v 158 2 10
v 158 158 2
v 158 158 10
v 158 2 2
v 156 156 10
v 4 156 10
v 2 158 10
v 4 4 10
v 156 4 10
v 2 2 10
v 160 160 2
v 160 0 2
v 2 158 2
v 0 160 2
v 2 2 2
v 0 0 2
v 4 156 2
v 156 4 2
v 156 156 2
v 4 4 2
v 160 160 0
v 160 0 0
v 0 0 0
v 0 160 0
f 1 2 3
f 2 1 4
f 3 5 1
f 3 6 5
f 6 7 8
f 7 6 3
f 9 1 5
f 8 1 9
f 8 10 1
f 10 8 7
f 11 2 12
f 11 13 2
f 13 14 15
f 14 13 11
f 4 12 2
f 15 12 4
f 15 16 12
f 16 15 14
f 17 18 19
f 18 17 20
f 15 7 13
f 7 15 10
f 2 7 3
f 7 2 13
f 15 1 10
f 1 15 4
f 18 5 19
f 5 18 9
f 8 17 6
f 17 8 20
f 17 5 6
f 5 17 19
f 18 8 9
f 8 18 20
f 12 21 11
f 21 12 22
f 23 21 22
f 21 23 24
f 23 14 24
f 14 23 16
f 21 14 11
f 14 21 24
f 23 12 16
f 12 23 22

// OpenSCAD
$fn = 100;

Height = 196;
Width = 100;
RadiusOuter = 20;

StripeWidth = 7;
StripeBorder = 1.5;
StripeOuterWidth = StripeWidth+2*StripeBorder;
StripeBottom = 2;
StripeHeight = 14;
CableHeight = 2;
TrennerHeigh = 165;
TrennerAbstandUnten = 10;
TrennerAbstandOben = 3;

StandConnectorHeight = 10;
StandConnectorWidth = 44;
StandConnectorInnerWidth = StandConnectorWidth - 2*5;

Depth = StripeBottom + StripeHeight + CableHeight;
InnerWidth = Width - StripeWidth;

ConnectorGap = 20;

StandDepth = 160;
StandHeight = 33;
StandWidth = 160;
StandBorder = 2;

ESP32Width = 28;
ESP32Length = 49;
ESP32XOffset = 30;
ESP32YOffset = 35;

ESP32PCBHolderDepth = 7;
ESP32PCBHolderShortDepth = 8;
ESP32PCBHolderHeight = 13;
Esp32PCBWidth = 48.8;
ESP32PCBLength = 71;
ESP32PCBShortLength = 10;
ESP32PCBOffsetX = ESP32XOffset-10.5;
ESP32PCBOffsetY = ESP32YOffset-ESP32PCBHolderDepth-10;
ESP32PCBOffsetZ = 9.5;
ESP32PCBThickness = 2;
ESP32PCBGapDepth = 2;

RFIDHolderOffsetY = ESP32YOffset+103;
PFIDHolderOffsetX = ESP32PCBOffsetX+3;
RFIDHolderHoleDistanceX = 25.5;
RFIDHolderHeight = 3;

RTCHolderOffset_X = 133;
RTCHolderOffsetY = ESP32PCBOffsetY-3;
RTCHolderHoleDistance = 19.5;

// ConnectorHolderOffsetZ = 11;
ConnectorPCBWidth = 20.3;
ConnectorPCBLength = 80;
ConnectorHolderBottomHeight = 1.2;
ConnectorholderBottomWidth = 10;
ConnectorHolderBottomDepth = 8;
ConnectorHolderPCBGap = 2;
ConnectorHolderPCBDepth = 2.0;
ConnectorHolderPCBHeight = 5.5;
ConnectorHolderPCBWidth = 3.5;

KeypadKeyBreite = 13;
KeypadSpalten = 5;
KeypadReihen = 4;
KeypadAussparungBreite = KeypadKeyBreite * KeypadSpalten;
KeypadAussparungTiefe = KeypadKeyBreite * KeypadReihen;
KeypadOffsetY = 145;
KeypadOffsetX = 75;
KeypadHalterHoehe = 3.5;
KeypadPlatinenBreite = 100;
KeypadHalterOffsetX1 = 17.5;
KeypadHalterOffsetX2 = 19.5;
KeypadHalterOffsetY1 = 6;
KeypadHalterOffsetY2 = 71;
KeypadSpalt = 0.7;

DisplayHalterDurchmesserBohrung = 3;
DisplayHalterOffsetX = -1.65;
DisplayHalterOffsetY = 7.4;
DisplayHalterKantenlaenge = DisplayHalterDurchmesserBohrung + 4;

Keys =       ["►", "6", "‖", "8", "©", "1", "2", "3", "4", "T3", "▼", "▲", "X", "H", "T2", "+", "-", "▐◄", "►▌", "T1"];
KeysOffset = [0,   0,   3,   0,   0,   0,   0,   0,   0,   -2,   0,   0,   0,   0,   -2,   0,   0,   -3.5, -3,   -2];
KeysSize   = [2,   0,   2,   0,   1,   0,   0,   0,   0,   1,    1,   1,   1,   1,    1,   1,   1,   1,    1,    1];

ScrewDiameter = 3;
DigitAbstand = 25;

SchwalbenschwanzHoehe = 5;
SchwalbenschwanzBreite1 = 5;
SchwalbenschwanzBreite2 = 3;

BottomBorderHeight = 8;

//Digit(DigitAbstand, false, true);
// translate([0, Width + DigitAbstand, 5])
//     Digit(0, false, false);    
// translate([0, 2*Width + 2*DigitAbstand, 0])
//     Trenner();

// translate([0, 2*Width + 3*DigitAbstand+StripeOuterWidth, 5])
//     Digit(DigitAbstand, false, false);

// translate([0, 3*Width + 4*DigitAbstand+StripeOuterWidth, 0])
//     Digit(0, true, false); 

//Stand();
//StandInvers();

Bottom();

module Bottom()
{
    cube([StandWidth, StandDepth, StandBorder]);
    translate([StandBorder, StandBorder, StandBorder])
    difference()
    {
        cube([StandWidth-2*StandBorder, StandDepth-2*StandBorder, BottomBorderHeight]);
        translate([StandBorder, StandBorder, 0])
        {
            cube([StandWidth-4*StandBorder, StandDepth-4*StandBorder, BottomBorderHeight+1]);
        }
    }
}

//Key("A", true, 0, 2);
module StandInvers()
{
    translate([KeypadOffsetX, KeypadOffsetY, StandBorder])
    {
        rotate([180,0,0])
            KeyPad(false);
    }
    
    translate([23, 90, 0])
        scale([0.1, 0.1, 1])
            linear_extrude(StandBorder)
                import("rfid.svg");
}

module Stand()
{
    difference()
    {
        cube([StandWidth, StandDepth, StandHeight]);
        translate([StandBorder, StandBorder, StandBorder])
        {
            cube([StandWidth-2*StandBorder, StandDepth-2*StandBorder, StandHeight]);
        }
        
        // ESP32 Hole
        translate([ESP32XOffset, ESP32YOffset, 0])
            cube([ESP32Length, ESP32Width, 100]);
        
        translate([KeypadOffsetX, KeypadOffsetY, StandBorder])
        {
            rotate([180,0,0])
                KeyPad(true);
        }
        
        translate([23, 90, 0])
            scale([0.1, 0.1, 1])
                linear_extrude(10)
                    import("rfid.svg");

                
        translate([(StandWidth-StandConnectorInnerWidth)/2, 0, 0])
            cube([StandConnectorInnerWidth, Depth, StandConnectorHeight]);
        translate([(StandWidth-StandConnectorWidth)/2, 0, 0])
            cube([StandConnectorWidth, StripeBottom, StandConnectorHeight]);
    }
    translate([KeypadOffsetX-KeypadAussparungTiefe/2, KeypadOffsetY-KeypadAussparungBreite, StandBorder])
        KeypadHalter();
    
    // ESP32 Holder
    translate([ESP32PCBOffsetX, ESP32PCBOffsetY+ESP32PCBGapDepth, StandBorder])
        ESP32PCBHolderLong();  
    translate([ESP32PCBOffsetX, ESP32PCBOffsetY+ESP32PCBHolderDepth+Esp32PCBWidth-ESP32PCBGapDepth, StandBorder])
    {
        ScrewHolder(ESP32PCBOffsetZ, 0);
    }
    translate([ESP32PCBOffsetX+ESP32PCBLength-ESP32PCBShortLength, ESP32PCBOffsetY+ESP32PCBHolderDepth+Esp32PCBWidth-ESP32PCBGapDepth, StandBorder])
        ScrewHolder(ESP32PCBOffsetZ, 0);
    
    // RFID Holder
    translate([PFIDHolderOffsetX, RFIDHolderOffsetY-ESP32PCBHolderShortDepth, StandBorder])
    {
        ScrewHolder(RFIDHolderHeight, 0);
    }
    translate([PFIDHolderOffsetX+RFIDHolderHoleDistanceX, RFIDHolderOffsetY-ESP32PCBHolderShortDepth, StandBorder])
        ScrewHolder(RFIDHolderHeight, 0);
    
    // ConnectorHolder
    translate([StandWidth,5,StandBorder])
    rotate([0,0,90])
        ConnectorHolder();
    
    // RTC Holder
   
}

module ConnectorHolder()
{
    cube([ConnectorholderBottomWidth, ConnectorHolderBottomDepth, ConnectorHolderBottomHeight]);
    translate([0, 0, ConnectorHolderBottomHeight])
    {
        cube([ConnectorholderBottomWidth, ConnectorHolderPCBDepth, ConnectorHolderPCBGap]);
        translate([ConnectorholderBottomWidth, 0, 0])
            rotate([0,-90,0])
                linear_extrude(ConnectorholderBottomWidth)
                    polygon(points=[[ConnectorHolderPCBHeight,0],[ConnectorHolderPCBGap,0],[ConnectorHolderPCBGap,ConnectorHolderPCBWidth],]);
    }

    translate([ConnectorPCBLength-ConnectorholderBottomWidth*1.5, 0, 0])
    {
        cube([ConnectorholderBottomWidth, ConnectorHolderBottomDepth, ConnectorHolderBottomHeight]);
        translate([0, 0, ConnectorHolderBottomHeight])
        {
            cube([ConnectorholderBottomWidth, ConnectorHolderPCBDepth, ConnectorHolderPCBGap]);
            translate([ConnectorholderBottomWidth, 0, 0])
                rotate([0,-90,0])
                    linear_extrude(ConnectorholderBottomWidth)
                        polygon(points=[[ConnectorHolderPCBHeight,0],[ConnectorHolderPCBGap,0],[ConnectorHolderPCBGap,ConnectorHolderPCBWidth],]);
        }
    }

    translate([ConnectorPCBLength-ConnectorholderBottomWidth*.5, 2*ConnectorHolderPCBDepth+ConnectorPCBWidth+1, 0])
    {
        rotate([0,0,180])
        {
            cube([ConnectorholderBottomWidth, ConnectorHolderBottomDepth, ConnectorHolderBottomHeight]);
            translate([0, 0, ConnectorHolderBottomHeight])
            {
                cube([ConnectorholderBottomWidth, ConnectorHolderPCBDepth, ConnectorHolderPCBGap]);
                translate([ConnectorholderBottomWidth, 0, 0])
                    rotate([0,-90,0])
                        linear_extrude(ConnectorholderBottomWidth)
                            polygon(points=[[ConnectorHolderPCBHeight,0],[ConnectorHolderPCBGap,0],[ConnectorHolderPCBGap,ConnectorHolderPCBWidth],]);
            }

            translate([ConnectorPCBLength-ConnectorholderBottomWidth*1.5, 0, 0])
            {
                cube([ConnectorholderBottomWidth, ConnectorHolderBottomDepth, ConnectorHolderBottomHeight]);
                translate([0, 0, ConnectorHolderBottomHeight])
                {
                    cube([ConnectorholderBottomWidth, ConnectorHolderPCBDepth, ConnectorHolderPCBGap]);
                    translate([ConnectorholderBottomWidth, 0, 0])
                        rotate([0,-90,0])
                            linear_extrude(ConnectorholderBottomWidth)
                                polygon(points=[[ConnectorHolderPCBHeight,0],[ConnectorHolderPCBGap,0],[ConnectorHolderPCBGap,ConnectorHolderPCBWidth],]);
                }
            }
        }
    }
}

module ESP32PCBHolderLong()
{
    difference()
    {
        cube([ESP32PCBLength, ESP32PCBHolderDepth, ESP32PCBHolderHeight]);
        translate([0,ESP32PCBHolderDepth-ESP32PCBGapDepth,ESP32PCBOffsetZ])
            cube([ESP32PCBLength, ESP32PCBGapDepth, ESP32PCBThickness]);
    }
}

module ScrewHolder(height, rotate)
{
    rotate([0,0,rotate])
    {
        difference()
        {
            cube([ESP32PCBShortLength, ESP32PCBHolderShortDepth, height]);
            translate([ESP32PCBShortLength/2, ESP32PCBHolderShortDepth-ScrewDiameter, 0])
                cylinder(d=ScrewDiameter, h=100);
        }
    }
}

module KeyPad(invers)
{
    if (invers)
    {
        translate([0,KeypadAussparungTiefe,0])
            cube([KeypadAussparungBreite + KeypadSpalt,KeypadSpalt,StandBorder]);
    }

    for (y=[0:KeypadReihen-1])
    {
        for (x=[0:KeypadSpalten-1])
        {
            index = y*KeypadSpalten+x;
            translate([x*KeypadKeyBreite,y*KeypadKeyBreite,0])
            {
                Key(Keys[index], invers, KeysOffset[index], KeysSize[index]);
            }
        }
    }
}

module Key(text, invers, offset, keySize)
{
    if (keySize > 0)
    {
        if (invers)
        {
            difference()
            {
                cube([KeypadKeyBreite*keySize + KeypadSpalt,KeypadKeyBreite*keySize-2,StandBorder+1.5]);
                translate([KeypadSpalt,KeypadSpalt,StandBorder-1])
                {
                    cube([KeypadKeyBreite*keySize-KeypadSpalt,KeypadKeyBreite*keySize,StandBorder]);
                }
            }
        }
        
        translate([4.5+offset,4,1])
        {
            linear_extrude(1)
            { 
                if (keySize == 1)
                {
                    size = 6 - len(text) * 0.5;
                    text(text, size=size, font = "Arial:style=Bold");
                }
                else
                {
                    size = (6 - len(text) * 0.5)*3;
                    text(text, size=size, font = "Arial:style=Bold");
                }
                
            }
        }
    }
}

module KeypadHalter()
{
  Rechts = KeypadHalterOffsetX1;
  Links = KeypadHalterOffsetX1 + 83.8;
  Links_alt = 0 - KeypadHalterOffsetX2;
  Unten = KeypadHalterOffsetY1;
  Oben = KeypadHalterOffsetY1 + 63.5;
  Oben_alt = KeypadHalterOffsetY2;
    
  translate([Rechts,Unten,0])
  {
    Halter(DisplayHalterKantenlaenge, KeypadHalterHoehe, DisplayHalterDurchmesserBohrung);
  }
  
  translate([Links,Unten,0])
  {
    Halter(DisplayHalterKantenlaenge, KeypadHalterHoehe, DisplayHalterDurchmesserBohrung);
  }
   
  translate([Rechts,Oben,0])
  {
    Halter(DisplayHalterKantenlaenge, KeypadHalterHoehe, DisplayHalterDurchmesserBohrung);
  }
  
  translate([Links,Oben,0])
  {
    Halter(DisplayHalterKantenlaenge, KeypadHalterHoehe, DisplayHalterDurchmesserBohrung);
  }
}

module Halter(Kantenlaenge, Hoehe, DurchmesserBohrung)
{
  translate([-Kantenlaenge/2, -Kantenlaenge/2, 0])
  {
    difference()
    {
      cube([Kantenlaenge, Kantenlaenge, Hoehe]);
      translate([Kantenlaenge/2, Kantenlaenge/2,0])
      {
        cylinder(h=Hoehe, d=DurchmesserBohrung);       
      }
    }
  }
}

module Trenner()
{
    difference()
    {
        union()
        {
            translate([0,-DigitAbstand,0])
                DigitConnector(StripeOuterWidth+DigitAbstand*3,0, false);
            translate([-StandConnectorHeight, -Width/2+StripeOuterWidth/2,0])
                StandConnector();

            cube([TrennerHeigh+TrennerAbstandOben+TrennerAbstandUnten, StripeOuterWidth, Depth]);

            translate([-StandConnectorHeight/2,(StripeOuterWidth+DigitAbstand*3)/2+5,0])
                SchwalbenschwanzVerbinder();
        }

        // Aussparung Mitte
        translate([-StandConnectorHeight-2*StripeBorder-50,-ConnectorGap/2+StripeOuterWidth/2,-0.001-StripeBorder])
            cube([StandConnectorHeight+StripeBorder+50, ConnectorGap, Depth]);

        // Stripe Aussparung
        translate([StandConnectorHeight,StripeBorder,StripeBottom+CableHeight])
            cube([TrennerHeigh, StripeWidth, Depth*2]);
        translate([StandConnectorHeight-200,StripeBorder+1,StripeBottom])
            cube([TrennerHeigh+200, StripeWidth-2, Depth-2*StripeBottom]);

        // Horizontaler Kabelsteg
        translate([-StandBorder-2,-100,-0.1])
            cube([2, 200, 8]);

        translate([-StandConnectorHeight/2,(-StripeOuterWidth-DigitAbstand*3)/2+SchwalbenschwanzHoehe,0])
            SchwalbenschwanzVerbinder();
    }
}

module SchwalbenschwanzVerbinder()
{
    linear_extrude(Depth)
    {
        polygon(points=[
            [SchwalbenschwanzBreite2/2,0],
            [SchwalbenschwanzBreite1/2,SchwalbenschwanzHoehe],
            [-SchwalbenschwanzBreite1/2,SchwalbenschwanzHoehe],
            [-SchwalbenschwanzBreite2/2,0]]);
    }
}

module Digit(connectorOffsetY, endeLinks, endeRechts)
{
    difference()
    {
        union()
        {
            DigitConnector(Width,connectorOffsetY, true, endeLinks, endeRechts);
            DigitHolder(Width);
        }
        
        // translate([-StandConnectorHeight,(Width-ConnectorGap)/2,-StripeBorder])
        //     cube([StandConnectorHeight+StripeBorder, ConnectorGap, Depth]);
        // translate([StripeBorder,(Width-ConnectorGap)/2,StripeBottom+CableHeight])
        //     cube([StandConnectorHeight, ConnectorGap, Depth]);
        // translate([StripeBorder,(Width-ConnectorGap)/2,StripeBottom])
        //     cube([3, ConnectorGap, Depth]);
        
        // translate([-StripeBottom,Width-5-(Width-StandConnectorWidth)/2,-StripeBottom])
        //     cube([StripeBottom, 5, Depth]);
        // translate([-StripeBottom,(Width-StandConnectorWidth)/2,-StripeBottom])
        //     cube([StripeBottom, 5, Depth]);
    }
}


module DigitHolder(width)
{
    difference()
    {
        union()
        {
            Base(width);
            translate([(Height-StripeOuterWidth)/2, 0, 0])
                cube([StripeOuterWidth, Width, Depth]);
        }
        
        translate([0,0,StripeBottom + CableHeight])  
        {
            difference()
            {
                RoundedRectangle(RadiusOuter, StripeBorder);
                RoundedRectangle(RadiusOuter, StripeBorder + StripeWidth);
            }
        }
        
        translate([0,0,StripeBottom])  
        {
            difference()
            {
                RoundedRectangle(RadiusOuter, StripeBorder+1);
                RoundedRectangle(RadiusOuter, StripeBorder+StripeWidth-1);
            }
        }
        
        translate([(Height-StripeOuterWidth)/2+StripeBorder, StripeWidth/2, StripeBottom+CableHeight])
           cube([StripeWidth, InnerWidth, Depth]);
        
        translate([(Height-StripeOuterWidth)/2+StripeBorder+2, StripeWidth/2, StripeBottom])
           cube([StripeWidth-4, InnerWidth, Depth]);
    }
}

module Base(width)
{
    difference()
    {
        RoundedRectangle(RadiusOuter, 0);
        RoundedRectangle(RadiusOuter, StripeOuterWidth);
        
        // Durchbruch
        translate([-StandBorder-2, width/2,3])
            cube([10, 20, 8]);
    }
}

module RoundedRectangle(radius, offset)
{
    offsetradius = radius - offset;
    hull()
    {
        translate([radius, radius, 0])
            cylinder(h=Depth, r=offsetradius);
        translate([radius, Width-radius, 0])
            cylinder(h=Depth, r=offsetradius);
        translate([Height-radius, Width-radius, 0])
            cylinder(h=Depth, r=offsetradius);
        translate([Height-radius, radius, 0])
            cylinder(h=Depth, r=offsetradius);
    }
}

module DigitConnector(width, offsetY, durchbruch, endeLinks, endeRechts)
{
    difference()
    {
        union()
        {
            translate([-StandConnectorHeight,-DigitAbstand/2+offsetY,0])
            {
                cube([StandConnectorHeight, width, Depth]);
                if (!endeLinks)
                {
                    translate([StandConnectorHeight/2,width,0])
                        SchwalbenschwanzVerbinder();
                }
            }
        }

        // Durchbruch
        if (durchbruch)
            translate([-StandBorder-2, width/2,3])
                cube([20, 20, 8]);

        if (!endeRechts)
        {
            translate([-StandConnectorHeight/2,-DigitAbstand/2+offsetY,0])
                SchwalbenschwanzVerbinder();
            // Horizontaler Kabelsteg
            translate([-StandBorder-2,-325,-0.1])
                cube([2, 400, 8]);
        }
        if (!endeLinks)
        {
            // Horizontaler Kabelsteg
            translate([-StandBorder-2,25,-0.1])
                cube([2, 400, 8]);
        }
        if (!endeLinks && !endeRechts)
        {
            // Horizontaler Kabelsteg
            translate([-StandBorder-2,-200,-0.1])
                cube([2, 400, 8]);
        }
    }
}

module StandConnector()
{
    difference()
    {
        translate([-StandConnectorHeight,(Width-StandConnectorWidth)/2,0])
            cube([StandConnectorHeight, StandConnectorWidth, Depth]);

        translate([-StripeBottom,Width-5-(Width-StandConnectorWidth)/2,-StripeBottom])
            cube([StripeBottom, 5, Depth]);
        translate([-StripeBottom,(Width-StandConnectorWidth)/2,-StripeBottom])
            cube([StripeBottom, 5, Depth]);
    }
}
